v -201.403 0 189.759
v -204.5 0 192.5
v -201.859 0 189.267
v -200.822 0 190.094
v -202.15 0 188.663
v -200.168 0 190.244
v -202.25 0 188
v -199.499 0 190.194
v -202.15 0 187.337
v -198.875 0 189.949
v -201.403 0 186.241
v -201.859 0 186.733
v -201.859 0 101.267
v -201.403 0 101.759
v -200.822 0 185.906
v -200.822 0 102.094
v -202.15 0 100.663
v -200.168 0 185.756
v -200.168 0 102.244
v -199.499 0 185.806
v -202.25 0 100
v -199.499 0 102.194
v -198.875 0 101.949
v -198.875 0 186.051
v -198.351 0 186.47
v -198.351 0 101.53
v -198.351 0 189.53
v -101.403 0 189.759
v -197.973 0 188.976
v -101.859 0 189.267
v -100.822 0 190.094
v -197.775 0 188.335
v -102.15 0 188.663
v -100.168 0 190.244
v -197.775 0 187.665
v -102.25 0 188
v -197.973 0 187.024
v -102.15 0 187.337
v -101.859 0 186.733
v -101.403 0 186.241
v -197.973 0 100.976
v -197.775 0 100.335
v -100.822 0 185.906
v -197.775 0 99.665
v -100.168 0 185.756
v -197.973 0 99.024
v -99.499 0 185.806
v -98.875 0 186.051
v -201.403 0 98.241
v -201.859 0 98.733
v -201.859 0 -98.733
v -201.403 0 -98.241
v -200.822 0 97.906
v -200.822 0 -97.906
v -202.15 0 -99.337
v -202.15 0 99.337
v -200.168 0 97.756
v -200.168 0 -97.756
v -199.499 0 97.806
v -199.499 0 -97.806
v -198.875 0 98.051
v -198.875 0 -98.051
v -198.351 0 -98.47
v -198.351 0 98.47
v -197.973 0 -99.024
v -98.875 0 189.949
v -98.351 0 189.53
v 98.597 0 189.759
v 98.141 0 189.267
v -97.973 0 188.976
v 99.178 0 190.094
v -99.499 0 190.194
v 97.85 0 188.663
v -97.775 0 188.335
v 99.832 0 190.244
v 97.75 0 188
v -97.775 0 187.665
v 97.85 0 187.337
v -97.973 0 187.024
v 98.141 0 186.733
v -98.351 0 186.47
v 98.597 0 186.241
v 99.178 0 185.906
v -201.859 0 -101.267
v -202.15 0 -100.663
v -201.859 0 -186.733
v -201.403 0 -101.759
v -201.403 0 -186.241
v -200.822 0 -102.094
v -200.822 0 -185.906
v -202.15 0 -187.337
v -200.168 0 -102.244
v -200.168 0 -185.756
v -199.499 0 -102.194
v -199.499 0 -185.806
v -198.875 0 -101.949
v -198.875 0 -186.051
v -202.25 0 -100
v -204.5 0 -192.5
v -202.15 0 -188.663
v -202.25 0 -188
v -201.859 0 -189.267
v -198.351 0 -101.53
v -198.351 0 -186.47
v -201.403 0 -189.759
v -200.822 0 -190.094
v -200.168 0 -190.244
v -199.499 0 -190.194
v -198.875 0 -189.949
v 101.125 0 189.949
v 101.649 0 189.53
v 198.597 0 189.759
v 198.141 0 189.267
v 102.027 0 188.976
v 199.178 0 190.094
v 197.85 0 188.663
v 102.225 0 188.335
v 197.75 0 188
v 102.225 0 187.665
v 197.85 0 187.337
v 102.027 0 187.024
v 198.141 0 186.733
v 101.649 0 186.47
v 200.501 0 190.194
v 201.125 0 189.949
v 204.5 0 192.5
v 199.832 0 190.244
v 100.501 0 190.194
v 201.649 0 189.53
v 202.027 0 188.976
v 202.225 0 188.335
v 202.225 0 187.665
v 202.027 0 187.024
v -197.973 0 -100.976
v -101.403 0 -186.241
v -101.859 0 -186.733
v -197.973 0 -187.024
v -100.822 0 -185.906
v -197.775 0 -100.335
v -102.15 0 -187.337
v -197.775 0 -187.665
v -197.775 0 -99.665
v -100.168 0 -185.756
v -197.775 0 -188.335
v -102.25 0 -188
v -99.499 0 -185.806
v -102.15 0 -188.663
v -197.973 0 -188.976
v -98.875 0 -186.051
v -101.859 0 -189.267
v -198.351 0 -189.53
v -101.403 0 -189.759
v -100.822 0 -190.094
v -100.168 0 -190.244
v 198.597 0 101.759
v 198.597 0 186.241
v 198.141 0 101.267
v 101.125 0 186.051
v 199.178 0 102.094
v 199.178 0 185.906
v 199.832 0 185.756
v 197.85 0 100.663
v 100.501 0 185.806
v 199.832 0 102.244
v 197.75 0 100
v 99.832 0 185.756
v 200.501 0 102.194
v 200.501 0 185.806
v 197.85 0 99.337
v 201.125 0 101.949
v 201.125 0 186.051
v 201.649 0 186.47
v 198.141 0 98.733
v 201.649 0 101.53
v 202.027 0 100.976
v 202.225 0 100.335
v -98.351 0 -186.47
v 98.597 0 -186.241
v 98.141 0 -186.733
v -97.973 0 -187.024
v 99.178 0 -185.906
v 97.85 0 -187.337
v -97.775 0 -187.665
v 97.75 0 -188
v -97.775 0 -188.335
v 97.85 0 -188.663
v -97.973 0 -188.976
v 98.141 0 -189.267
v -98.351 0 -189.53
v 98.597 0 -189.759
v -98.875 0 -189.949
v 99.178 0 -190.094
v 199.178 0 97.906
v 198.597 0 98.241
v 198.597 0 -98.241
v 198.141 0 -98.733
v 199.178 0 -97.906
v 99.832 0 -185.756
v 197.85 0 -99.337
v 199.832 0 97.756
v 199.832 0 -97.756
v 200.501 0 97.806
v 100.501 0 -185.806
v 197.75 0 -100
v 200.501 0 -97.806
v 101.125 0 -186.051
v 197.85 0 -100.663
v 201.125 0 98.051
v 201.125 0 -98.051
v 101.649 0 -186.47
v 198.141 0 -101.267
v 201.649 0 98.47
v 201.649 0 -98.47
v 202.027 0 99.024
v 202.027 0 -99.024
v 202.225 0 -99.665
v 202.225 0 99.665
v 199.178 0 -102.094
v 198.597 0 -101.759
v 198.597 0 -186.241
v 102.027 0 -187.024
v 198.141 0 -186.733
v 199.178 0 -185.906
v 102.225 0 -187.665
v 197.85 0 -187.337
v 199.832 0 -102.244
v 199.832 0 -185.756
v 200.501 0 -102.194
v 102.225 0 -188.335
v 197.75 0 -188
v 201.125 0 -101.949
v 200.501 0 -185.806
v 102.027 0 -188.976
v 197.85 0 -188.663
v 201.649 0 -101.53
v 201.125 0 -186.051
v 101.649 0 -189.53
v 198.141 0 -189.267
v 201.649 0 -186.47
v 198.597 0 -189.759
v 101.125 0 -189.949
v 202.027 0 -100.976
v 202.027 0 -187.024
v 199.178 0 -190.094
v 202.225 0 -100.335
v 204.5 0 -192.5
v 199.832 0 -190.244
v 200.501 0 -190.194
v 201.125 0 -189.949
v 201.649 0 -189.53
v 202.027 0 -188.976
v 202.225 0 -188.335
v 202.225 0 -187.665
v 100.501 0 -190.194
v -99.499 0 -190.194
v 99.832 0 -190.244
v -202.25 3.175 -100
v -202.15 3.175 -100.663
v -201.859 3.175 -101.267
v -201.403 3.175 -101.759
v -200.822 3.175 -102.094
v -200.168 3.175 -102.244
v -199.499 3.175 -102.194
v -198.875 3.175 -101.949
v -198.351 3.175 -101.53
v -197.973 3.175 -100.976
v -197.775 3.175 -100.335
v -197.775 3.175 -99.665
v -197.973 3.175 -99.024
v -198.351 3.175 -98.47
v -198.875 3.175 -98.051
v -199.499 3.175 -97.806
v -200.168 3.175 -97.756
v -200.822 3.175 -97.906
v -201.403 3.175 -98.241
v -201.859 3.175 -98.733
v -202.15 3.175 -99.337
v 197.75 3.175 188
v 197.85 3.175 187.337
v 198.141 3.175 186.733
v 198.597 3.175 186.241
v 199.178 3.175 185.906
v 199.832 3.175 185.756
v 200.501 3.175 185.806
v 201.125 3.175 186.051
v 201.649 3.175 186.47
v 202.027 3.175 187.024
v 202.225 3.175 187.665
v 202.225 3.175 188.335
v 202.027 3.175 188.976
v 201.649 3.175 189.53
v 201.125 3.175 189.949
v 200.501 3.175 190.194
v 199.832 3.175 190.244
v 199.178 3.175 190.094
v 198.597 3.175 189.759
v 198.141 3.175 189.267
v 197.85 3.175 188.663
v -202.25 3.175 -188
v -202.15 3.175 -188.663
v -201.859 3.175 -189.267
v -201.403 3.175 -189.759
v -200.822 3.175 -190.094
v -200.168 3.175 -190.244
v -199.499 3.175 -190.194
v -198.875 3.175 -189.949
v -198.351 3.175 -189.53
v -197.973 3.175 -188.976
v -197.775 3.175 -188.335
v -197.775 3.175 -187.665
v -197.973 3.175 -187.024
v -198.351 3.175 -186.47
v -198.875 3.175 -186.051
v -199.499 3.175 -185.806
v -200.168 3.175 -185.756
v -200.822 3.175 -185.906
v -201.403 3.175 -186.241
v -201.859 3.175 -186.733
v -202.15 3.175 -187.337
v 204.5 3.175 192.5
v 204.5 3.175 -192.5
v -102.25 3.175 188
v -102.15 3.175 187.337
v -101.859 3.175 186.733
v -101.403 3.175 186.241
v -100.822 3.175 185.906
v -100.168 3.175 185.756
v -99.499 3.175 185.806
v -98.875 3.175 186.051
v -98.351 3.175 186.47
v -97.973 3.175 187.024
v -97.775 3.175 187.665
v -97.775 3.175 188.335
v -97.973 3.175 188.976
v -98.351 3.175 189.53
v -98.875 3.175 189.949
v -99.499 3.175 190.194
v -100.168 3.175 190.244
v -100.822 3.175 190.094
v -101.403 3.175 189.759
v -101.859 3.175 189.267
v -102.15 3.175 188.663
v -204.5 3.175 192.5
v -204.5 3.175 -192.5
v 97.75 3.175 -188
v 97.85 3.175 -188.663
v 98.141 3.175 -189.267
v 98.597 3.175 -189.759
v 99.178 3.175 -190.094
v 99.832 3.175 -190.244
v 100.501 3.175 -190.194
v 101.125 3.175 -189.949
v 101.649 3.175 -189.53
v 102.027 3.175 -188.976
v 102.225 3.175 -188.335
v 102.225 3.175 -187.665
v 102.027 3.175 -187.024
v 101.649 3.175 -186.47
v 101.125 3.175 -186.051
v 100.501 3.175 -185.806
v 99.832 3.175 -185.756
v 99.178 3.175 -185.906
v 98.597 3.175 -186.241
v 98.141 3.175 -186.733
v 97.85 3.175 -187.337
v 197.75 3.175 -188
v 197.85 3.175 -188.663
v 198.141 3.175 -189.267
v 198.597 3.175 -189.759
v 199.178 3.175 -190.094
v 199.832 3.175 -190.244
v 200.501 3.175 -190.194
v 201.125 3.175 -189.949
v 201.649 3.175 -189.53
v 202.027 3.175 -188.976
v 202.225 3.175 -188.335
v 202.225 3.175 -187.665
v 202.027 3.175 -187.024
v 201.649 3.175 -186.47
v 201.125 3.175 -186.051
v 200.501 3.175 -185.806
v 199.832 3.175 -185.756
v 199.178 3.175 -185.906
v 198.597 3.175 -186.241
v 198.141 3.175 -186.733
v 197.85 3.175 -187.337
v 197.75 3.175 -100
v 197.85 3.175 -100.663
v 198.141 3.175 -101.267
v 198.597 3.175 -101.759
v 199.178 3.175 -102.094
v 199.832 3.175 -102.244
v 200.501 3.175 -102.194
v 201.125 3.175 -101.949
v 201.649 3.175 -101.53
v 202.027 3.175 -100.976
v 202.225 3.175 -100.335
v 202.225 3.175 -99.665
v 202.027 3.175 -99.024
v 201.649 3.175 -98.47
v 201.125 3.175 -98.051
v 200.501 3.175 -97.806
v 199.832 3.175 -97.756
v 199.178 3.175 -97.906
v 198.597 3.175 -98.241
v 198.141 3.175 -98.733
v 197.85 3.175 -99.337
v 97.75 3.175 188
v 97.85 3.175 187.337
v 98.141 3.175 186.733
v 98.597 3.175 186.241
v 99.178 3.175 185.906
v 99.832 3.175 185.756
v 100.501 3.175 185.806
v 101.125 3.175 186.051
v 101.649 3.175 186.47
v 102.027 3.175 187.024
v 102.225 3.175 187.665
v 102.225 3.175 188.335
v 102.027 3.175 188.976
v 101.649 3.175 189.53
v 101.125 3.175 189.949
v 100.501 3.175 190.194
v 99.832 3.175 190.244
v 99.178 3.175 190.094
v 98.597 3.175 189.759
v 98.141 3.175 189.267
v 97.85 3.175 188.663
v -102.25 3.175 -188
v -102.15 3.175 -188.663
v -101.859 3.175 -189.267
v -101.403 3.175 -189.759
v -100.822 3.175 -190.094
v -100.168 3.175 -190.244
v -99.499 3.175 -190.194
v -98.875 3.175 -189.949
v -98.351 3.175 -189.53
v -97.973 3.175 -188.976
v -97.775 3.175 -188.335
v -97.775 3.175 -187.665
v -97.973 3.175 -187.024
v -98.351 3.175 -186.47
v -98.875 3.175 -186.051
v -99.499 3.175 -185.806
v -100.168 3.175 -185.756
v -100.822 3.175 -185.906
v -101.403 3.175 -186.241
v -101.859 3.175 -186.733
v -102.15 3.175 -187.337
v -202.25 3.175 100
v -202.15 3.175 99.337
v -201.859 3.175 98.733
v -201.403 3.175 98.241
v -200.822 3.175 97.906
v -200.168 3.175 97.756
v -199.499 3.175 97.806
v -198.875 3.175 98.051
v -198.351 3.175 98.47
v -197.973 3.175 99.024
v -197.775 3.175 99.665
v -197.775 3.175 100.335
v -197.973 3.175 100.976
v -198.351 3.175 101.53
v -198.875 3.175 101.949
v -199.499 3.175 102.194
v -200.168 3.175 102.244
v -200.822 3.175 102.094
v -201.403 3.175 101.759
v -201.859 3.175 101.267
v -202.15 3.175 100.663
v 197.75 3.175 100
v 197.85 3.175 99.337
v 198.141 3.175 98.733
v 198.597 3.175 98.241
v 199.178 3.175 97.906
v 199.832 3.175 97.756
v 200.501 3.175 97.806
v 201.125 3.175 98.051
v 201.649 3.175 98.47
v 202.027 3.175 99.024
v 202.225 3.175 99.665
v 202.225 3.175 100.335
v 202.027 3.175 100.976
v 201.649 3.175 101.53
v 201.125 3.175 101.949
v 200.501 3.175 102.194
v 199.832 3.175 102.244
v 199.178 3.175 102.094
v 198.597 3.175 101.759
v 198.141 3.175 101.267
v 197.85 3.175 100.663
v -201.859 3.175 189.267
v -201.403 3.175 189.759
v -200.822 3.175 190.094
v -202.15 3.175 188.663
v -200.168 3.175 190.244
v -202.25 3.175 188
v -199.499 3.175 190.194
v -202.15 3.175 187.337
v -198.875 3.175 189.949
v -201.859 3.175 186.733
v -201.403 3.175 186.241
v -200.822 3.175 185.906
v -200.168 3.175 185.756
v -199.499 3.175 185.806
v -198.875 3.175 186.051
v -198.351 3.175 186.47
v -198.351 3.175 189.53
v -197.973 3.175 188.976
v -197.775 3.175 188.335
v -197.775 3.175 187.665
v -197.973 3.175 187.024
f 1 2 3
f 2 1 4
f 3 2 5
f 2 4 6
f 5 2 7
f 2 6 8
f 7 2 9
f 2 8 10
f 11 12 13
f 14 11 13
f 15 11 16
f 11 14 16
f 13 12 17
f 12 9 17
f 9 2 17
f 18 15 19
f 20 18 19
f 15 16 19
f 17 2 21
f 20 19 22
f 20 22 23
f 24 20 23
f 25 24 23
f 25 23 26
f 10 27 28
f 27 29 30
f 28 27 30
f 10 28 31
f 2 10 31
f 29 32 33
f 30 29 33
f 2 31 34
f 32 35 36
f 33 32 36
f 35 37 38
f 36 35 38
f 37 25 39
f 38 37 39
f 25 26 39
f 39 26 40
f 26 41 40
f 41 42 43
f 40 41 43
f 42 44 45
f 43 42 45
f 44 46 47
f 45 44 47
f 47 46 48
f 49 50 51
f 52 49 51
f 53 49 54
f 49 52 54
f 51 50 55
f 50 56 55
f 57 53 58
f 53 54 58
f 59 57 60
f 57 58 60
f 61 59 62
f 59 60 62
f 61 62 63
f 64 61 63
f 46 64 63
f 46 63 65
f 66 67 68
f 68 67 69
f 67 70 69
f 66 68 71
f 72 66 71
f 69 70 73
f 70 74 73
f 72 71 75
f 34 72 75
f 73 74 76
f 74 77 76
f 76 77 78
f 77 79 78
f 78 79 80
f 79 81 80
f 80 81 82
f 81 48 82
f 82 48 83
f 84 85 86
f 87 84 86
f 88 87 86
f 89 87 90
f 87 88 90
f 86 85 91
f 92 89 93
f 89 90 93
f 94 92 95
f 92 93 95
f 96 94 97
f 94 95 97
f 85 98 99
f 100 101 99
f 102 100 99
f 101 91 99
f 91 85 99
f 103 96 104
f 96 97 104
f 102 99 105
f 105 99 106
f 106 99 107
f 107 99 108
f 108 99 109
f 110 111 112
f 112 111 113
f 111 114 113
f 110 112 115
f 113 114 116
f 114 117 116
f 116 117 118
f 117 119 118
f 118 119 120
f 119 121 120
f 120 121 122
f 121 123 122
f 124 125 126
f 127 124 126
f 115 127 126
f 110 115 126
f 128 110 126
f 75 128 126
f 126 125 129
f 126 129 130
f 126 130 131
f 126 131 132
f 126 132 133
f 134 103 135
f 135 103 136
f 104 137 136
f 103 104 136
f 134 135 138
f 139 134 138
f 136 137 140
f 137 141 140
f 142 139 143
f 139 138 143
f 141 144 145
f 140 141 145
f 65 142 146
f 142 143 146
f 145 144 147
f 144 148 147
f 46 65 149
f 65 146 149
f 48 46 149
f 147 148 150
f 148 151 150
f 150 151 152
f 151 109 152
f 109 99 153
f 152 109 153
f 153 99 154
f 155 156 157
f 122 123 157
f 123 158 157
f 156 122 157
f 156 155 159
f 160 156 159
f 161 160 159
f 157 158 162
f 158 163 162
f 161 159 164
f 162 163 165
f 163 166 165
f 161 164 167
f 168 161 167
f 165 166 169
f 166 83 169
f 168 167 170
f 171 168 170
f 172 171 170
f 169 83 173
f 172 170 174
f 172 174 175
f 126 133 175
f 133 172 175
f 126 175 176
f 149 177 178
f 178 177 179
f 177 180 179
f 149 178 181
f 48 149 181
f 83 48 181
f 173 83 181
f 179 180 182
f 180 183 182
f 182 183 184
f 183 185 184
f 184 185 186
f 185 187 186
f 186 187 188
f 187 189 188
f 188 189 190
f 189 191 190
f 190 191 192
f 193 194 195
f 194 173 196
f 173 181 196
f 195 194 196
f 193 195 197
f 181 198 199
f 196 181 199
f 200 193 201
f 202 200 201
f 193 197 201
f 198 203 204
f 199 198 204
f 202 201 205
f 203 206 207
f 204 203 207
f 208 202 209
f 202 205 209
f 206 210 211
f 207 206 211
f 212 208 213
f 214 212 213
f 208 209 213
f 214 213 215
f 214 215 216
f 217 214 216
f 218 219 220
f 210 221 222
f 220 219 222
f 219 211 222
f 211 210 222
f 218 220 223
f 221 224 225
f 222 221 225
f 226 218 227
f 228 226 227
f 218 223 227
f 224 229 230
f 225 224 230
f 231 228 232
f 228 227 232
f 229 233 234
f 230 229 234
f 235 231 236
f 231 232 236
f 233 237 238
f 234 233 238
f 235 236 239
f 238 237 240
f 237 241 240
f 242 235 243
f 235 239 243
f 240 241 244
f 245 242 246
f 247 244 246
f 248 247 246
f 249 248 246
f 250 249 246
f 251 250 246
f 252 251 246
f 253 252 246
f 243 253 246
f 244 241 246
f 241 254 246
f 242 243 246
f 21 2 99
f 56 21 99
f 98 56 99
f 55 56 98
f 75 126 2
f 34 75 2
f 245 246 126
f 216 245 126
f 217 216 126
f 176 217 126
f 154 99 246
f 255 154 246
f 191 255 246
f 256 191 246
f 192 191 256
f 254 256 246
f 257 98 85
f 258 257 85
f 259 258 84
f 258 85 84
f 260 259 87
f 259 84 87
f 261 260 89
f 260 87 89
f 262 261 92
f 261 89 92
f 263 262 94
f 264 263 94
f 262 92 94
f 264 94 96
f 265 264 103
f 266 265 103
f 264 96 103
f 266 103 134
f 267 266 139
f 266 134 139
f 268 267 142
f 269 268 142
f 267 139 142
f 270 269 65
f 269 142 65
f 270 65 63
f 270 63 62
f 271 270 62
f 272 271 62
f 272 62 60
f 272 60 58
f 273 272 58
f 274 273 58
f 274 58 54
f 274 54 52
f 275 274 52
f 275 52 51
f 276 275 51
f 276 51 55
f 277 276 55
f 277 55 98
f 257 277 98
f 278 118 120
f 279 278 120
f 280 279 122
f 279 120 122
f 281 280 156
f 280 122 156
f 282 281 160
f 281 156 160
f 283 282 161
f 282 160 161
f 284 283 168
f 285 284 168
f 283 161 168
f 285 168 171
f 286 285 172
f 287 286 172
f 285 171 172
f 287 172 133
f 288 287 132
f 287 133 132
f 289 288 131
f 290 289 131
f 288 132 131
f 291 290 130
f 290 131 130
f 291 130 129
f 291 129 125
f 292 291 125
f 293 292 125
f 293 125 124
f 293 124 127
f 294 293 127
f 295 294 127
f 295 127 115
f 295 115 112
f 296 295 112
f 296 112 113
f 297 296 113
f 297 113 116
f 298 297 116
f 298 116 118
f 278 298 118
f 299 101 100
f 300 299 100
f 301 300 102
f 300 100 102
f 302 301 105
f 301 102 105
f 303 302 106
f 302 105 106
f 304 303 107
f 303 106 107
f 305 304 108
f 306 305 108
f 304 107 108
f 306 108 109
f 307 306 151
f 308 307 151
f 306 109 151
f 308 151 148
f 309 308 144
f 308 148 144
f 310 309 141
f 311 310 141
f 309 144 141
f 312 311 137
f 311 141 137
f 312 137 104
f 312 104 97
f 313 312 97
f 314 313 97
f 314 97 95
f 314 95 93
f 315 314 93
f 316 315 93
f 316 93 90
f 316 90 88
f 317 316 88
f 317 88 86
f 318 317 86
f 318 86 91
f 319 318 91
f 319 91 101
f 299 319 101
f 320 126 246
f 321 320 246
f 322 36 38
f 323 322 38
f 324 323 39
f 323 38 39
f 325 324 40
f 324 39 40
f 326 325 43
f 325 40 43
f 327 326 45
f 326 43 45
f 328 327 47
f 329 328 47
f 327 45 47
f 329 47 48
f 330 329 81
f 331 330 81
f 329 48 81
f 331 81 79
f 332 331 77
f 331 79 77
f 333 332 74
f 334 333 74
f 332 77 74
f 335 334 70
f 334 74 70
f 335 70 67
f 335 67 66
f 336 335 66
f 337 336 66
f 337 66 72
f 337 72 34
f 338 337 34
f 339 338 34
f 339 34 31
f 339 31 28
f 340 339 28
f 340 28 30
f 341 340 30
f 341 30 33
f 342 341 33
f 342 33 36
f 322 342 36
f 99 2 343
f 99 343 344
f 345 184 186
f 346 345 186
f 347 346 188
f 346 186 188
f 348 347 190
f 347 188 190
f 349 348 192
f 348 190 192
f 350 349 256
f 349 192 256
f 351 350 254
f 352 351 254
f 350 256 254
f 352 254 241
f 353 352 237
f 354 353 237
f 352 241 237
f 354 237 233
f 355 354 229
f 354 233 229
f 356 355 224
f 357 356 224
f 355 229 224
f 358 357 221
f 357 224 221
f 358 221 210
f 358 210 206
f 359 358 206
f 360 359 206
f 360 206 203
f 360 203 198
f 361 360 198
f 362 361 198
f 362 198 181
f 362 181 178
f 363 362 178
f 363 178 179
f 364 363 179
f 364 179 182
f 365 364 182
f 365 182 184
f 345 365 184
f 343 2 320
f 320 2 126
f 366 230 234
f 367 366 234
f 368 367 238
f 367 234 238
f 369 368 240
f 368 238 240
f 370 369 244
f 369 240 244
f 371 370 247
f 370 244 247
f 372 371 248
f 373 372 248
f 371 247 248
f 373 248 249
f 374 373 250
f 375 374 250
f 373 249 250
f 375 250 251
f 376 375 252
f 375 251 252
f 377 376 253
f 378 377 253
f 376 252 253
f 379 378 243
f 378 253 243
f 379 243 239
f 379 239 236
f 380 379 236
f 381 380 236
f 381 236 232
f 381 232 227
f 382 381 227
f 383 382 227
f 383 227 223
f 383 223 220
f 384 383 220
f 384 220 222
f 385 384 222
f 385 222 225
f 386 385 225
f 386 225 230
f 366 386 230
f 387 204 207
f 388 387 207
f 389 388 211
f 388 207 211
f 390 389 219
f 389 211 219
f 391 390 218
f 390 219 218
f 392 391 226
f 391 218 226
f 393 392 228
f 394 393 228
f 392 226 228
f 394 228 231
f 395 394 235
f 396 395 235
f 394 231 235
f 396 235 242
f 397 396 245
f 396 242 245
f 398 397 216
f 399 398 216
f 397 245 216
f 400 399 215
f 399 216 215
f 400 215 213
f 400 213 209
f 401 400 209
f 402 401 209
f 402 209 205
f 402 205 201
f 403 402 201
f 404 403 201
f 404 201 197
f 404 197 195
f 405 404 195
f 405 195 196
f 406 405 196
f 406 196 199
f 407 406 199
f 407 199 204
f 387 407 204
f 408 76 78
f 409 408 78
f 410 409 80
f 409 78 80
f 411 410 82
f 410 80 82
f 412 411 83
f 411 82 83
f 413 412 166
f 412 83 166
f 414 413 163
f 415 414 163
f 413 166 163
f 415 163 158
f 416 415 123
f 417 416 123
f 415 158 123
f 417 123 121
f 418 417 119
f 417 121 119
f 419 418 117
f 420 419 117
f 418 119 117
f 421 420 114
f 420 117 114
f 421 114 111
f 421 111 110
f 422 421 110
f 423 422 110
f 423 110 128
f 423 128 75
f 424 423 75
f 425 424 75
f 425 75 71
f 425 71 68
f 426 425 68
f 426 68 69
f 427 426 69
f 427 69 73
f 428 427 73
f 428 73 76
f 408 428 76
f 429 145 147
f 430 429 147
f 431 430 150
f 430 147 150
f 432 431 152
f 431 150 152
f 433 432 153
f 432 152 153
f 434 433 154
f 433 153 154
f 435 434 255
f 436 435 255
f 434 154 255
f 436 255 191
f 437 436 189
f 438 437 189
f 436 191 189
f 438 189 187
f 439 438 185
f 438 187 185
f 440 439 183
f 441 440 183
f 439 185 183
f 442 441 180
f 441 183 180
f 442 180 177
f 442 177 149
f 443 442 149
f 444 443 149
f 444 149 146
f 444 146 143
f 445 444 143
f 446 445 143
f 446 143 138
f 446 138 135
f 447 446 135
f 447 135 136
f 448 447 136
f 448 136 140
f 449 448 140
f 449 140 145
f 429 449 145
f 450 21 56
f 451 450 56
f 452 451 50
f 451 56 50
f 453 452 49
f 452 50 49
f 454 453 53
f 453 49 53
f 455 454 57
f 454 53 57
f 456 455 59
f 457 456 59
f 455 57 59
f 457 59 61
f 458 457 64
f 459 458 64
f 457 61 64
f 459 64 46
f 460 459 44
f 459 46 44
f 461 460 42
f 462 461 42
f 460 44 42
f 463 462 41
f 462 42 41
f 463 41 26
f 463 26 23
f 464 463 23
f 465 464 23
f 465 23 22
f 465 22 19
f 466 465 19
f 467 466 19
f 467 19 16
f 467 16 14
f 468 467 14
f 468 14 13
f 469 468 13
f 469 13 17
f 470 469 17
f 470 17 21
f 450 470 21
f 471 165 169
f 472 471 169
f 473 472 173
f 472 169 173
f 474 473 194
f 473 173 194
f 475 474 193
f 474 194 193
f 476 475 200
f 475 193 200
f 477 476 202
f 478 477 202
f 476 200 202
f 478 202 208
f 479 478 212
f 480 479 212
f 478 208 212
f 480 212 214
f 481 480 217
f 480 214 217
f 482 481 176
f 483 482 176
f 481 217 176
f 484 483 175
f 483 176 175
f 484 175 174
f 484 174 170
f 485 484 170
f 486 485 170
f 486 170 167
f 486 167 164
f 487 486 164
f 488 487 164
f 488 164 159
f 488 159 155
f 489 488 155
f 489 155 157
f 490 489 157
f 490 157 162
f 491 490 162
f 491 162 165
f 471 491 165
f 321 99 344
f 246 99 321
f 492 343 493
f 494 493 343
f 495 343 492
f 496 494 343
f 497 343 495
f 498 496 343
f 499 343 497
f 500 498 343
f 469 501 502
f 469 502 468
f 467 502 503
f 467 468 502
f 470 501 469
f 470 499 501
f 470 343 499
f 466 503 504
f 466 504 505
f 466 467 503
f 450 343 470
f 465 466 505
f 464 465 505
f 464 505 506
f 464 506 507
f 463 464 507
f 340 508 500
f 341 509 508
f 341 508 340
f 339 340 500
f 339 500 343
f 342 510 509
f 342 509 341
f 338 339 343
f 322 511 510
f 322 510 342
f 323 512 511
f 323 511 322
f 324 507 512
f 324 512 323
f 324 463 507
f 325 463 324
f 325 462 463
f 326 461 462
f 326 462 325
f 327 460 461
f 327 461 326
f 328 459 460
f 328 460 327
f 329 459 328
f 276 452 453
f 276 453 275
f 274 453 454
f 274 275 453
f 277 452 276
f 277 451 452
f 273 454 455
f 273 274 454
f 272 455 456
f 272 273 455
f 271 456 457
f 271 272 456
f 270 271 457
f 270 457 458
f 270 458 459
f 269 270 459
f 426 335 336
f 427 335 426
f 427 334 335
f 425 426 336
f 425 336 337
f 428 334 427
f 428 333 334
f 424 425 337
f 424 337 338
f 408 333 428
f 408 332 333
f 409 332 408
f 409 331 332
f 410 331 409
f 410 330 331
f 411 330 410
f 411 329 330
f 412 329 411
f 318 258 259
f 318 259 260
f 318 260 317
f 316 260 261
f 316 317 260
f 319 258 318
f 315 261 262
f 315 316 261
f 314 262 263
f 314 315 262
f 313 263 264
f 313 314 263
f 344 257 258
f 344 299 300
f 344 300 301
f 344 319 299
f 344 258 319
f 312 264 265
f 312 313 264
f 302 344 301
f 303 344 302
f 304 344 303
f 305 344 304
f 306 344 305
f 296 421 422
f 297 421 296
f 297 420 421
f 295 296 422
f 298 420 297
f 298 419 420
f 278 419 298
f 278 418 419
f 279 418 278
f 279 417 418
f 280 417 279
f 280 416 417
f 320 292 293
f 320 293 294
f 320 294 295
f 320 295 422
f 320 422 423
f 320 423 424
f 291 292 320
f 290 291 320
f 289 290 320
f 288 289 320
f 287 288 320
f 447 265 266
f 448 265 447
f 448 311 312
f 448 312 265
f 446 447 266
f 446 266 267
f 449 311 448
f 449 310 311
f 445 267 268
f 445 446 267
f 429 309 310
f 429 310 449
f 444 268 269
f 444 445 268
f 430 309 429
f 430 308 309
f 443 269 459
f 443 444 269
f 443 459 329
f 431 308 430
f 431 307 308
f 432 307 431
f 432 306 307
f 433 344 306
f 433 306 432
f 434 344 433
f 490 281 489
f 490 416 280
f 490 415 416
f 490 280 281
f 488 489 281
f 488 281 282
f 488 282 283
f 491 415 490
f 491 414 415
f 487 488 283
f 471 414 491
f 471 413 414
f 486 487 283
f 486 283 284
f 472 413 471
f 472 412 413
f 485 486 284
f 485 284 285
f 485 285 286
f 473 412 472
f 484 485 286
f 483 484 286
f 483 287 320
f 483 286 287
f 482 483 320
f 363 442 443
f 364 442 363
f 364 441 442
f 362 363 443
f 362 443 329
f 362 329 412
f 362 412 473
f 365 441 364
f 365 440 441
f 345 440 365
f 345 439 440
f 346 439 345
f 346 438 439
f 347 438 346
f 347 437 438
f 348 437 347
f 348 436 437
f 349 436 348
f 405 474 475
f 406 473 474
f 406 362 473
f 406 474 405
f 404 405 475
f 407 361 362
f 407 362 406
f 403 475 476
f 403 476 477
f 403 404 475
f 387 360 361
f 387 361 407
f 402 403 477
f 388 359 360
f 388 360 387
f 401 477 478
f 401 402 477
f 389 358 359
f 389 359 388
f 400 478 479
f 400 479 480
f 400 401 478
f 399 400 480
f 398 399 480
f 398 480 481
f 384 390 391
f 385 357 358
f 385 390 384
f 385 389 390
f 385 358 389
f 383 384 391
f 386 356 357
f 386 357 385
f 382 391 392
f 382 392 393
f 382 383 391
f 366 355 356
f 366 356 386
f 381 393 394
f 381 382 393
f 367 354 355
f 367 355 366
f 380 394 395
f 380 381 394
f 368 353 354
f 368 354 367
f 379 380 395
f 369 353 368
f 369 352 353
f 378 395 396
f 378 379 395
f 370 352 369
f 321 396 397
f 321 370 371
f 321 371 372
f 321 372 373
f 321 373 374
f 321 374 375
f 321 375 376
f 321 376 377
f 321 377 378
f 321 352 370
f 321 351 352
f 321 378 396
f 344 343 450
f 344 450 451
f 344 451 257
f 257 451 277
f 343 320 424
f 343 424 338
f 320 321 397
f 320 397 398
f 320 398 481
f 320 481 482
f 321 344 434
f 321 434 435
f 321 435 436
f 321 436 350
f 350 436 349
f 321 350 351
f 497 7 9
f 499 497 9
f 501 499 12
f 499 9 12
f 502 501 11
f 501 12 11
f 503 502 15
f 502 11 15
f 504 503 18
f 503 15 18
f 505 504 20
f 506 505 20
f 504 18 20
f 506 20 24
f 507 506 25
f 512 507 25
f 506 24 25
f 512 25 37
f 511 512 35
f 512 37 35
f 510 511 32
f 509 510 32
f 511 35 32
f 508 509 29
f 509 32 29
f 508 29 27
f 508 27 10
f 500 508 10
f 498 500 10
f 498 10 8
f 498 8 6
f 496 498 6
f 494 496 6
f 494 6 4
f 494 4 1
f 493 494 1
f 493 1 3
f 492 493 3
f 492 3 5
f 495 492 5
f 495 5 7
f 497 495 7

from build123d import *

# Parameters (mm, degrees)
SKETCH1_W            = 409
SKETCH1_H            = 385
BOSS_EXTRUDE1_DEPTH  = 3.175
M4_CLEARANCE_HOLE1_D = 4.5


with BuildPart() as part:
    # Sketch1 → Boss-Extrude1 (new body)
    with BuildSketch(Plane(origin=(0, 0, 0), x_dir=(1, 0, 0), z_dir=(0, 1, 0))):
        Rectangle(SKETCH1_W, SKETCH1_H)
    extrude(amount=BOSS_EXTRUDE1_DEPTH)

    # M4 Clearance Hole1 (through all)
    with Locations(Plane(origin=(0, 3.175, 0), x_dir=(1, 0, 0), z_dir=(0, 1, 0))):
        with Locations((-200, 188), (-200, 100), (-200, -100), (200, -100), (200, 100), (200, 188), (-100, 188), (100, 188), (100, -188), (-100, -188), (200, -188), (-200, -188)):
            Hole(M4_CLEARANCE_HOLE1_D / 2)


solid = part.part
